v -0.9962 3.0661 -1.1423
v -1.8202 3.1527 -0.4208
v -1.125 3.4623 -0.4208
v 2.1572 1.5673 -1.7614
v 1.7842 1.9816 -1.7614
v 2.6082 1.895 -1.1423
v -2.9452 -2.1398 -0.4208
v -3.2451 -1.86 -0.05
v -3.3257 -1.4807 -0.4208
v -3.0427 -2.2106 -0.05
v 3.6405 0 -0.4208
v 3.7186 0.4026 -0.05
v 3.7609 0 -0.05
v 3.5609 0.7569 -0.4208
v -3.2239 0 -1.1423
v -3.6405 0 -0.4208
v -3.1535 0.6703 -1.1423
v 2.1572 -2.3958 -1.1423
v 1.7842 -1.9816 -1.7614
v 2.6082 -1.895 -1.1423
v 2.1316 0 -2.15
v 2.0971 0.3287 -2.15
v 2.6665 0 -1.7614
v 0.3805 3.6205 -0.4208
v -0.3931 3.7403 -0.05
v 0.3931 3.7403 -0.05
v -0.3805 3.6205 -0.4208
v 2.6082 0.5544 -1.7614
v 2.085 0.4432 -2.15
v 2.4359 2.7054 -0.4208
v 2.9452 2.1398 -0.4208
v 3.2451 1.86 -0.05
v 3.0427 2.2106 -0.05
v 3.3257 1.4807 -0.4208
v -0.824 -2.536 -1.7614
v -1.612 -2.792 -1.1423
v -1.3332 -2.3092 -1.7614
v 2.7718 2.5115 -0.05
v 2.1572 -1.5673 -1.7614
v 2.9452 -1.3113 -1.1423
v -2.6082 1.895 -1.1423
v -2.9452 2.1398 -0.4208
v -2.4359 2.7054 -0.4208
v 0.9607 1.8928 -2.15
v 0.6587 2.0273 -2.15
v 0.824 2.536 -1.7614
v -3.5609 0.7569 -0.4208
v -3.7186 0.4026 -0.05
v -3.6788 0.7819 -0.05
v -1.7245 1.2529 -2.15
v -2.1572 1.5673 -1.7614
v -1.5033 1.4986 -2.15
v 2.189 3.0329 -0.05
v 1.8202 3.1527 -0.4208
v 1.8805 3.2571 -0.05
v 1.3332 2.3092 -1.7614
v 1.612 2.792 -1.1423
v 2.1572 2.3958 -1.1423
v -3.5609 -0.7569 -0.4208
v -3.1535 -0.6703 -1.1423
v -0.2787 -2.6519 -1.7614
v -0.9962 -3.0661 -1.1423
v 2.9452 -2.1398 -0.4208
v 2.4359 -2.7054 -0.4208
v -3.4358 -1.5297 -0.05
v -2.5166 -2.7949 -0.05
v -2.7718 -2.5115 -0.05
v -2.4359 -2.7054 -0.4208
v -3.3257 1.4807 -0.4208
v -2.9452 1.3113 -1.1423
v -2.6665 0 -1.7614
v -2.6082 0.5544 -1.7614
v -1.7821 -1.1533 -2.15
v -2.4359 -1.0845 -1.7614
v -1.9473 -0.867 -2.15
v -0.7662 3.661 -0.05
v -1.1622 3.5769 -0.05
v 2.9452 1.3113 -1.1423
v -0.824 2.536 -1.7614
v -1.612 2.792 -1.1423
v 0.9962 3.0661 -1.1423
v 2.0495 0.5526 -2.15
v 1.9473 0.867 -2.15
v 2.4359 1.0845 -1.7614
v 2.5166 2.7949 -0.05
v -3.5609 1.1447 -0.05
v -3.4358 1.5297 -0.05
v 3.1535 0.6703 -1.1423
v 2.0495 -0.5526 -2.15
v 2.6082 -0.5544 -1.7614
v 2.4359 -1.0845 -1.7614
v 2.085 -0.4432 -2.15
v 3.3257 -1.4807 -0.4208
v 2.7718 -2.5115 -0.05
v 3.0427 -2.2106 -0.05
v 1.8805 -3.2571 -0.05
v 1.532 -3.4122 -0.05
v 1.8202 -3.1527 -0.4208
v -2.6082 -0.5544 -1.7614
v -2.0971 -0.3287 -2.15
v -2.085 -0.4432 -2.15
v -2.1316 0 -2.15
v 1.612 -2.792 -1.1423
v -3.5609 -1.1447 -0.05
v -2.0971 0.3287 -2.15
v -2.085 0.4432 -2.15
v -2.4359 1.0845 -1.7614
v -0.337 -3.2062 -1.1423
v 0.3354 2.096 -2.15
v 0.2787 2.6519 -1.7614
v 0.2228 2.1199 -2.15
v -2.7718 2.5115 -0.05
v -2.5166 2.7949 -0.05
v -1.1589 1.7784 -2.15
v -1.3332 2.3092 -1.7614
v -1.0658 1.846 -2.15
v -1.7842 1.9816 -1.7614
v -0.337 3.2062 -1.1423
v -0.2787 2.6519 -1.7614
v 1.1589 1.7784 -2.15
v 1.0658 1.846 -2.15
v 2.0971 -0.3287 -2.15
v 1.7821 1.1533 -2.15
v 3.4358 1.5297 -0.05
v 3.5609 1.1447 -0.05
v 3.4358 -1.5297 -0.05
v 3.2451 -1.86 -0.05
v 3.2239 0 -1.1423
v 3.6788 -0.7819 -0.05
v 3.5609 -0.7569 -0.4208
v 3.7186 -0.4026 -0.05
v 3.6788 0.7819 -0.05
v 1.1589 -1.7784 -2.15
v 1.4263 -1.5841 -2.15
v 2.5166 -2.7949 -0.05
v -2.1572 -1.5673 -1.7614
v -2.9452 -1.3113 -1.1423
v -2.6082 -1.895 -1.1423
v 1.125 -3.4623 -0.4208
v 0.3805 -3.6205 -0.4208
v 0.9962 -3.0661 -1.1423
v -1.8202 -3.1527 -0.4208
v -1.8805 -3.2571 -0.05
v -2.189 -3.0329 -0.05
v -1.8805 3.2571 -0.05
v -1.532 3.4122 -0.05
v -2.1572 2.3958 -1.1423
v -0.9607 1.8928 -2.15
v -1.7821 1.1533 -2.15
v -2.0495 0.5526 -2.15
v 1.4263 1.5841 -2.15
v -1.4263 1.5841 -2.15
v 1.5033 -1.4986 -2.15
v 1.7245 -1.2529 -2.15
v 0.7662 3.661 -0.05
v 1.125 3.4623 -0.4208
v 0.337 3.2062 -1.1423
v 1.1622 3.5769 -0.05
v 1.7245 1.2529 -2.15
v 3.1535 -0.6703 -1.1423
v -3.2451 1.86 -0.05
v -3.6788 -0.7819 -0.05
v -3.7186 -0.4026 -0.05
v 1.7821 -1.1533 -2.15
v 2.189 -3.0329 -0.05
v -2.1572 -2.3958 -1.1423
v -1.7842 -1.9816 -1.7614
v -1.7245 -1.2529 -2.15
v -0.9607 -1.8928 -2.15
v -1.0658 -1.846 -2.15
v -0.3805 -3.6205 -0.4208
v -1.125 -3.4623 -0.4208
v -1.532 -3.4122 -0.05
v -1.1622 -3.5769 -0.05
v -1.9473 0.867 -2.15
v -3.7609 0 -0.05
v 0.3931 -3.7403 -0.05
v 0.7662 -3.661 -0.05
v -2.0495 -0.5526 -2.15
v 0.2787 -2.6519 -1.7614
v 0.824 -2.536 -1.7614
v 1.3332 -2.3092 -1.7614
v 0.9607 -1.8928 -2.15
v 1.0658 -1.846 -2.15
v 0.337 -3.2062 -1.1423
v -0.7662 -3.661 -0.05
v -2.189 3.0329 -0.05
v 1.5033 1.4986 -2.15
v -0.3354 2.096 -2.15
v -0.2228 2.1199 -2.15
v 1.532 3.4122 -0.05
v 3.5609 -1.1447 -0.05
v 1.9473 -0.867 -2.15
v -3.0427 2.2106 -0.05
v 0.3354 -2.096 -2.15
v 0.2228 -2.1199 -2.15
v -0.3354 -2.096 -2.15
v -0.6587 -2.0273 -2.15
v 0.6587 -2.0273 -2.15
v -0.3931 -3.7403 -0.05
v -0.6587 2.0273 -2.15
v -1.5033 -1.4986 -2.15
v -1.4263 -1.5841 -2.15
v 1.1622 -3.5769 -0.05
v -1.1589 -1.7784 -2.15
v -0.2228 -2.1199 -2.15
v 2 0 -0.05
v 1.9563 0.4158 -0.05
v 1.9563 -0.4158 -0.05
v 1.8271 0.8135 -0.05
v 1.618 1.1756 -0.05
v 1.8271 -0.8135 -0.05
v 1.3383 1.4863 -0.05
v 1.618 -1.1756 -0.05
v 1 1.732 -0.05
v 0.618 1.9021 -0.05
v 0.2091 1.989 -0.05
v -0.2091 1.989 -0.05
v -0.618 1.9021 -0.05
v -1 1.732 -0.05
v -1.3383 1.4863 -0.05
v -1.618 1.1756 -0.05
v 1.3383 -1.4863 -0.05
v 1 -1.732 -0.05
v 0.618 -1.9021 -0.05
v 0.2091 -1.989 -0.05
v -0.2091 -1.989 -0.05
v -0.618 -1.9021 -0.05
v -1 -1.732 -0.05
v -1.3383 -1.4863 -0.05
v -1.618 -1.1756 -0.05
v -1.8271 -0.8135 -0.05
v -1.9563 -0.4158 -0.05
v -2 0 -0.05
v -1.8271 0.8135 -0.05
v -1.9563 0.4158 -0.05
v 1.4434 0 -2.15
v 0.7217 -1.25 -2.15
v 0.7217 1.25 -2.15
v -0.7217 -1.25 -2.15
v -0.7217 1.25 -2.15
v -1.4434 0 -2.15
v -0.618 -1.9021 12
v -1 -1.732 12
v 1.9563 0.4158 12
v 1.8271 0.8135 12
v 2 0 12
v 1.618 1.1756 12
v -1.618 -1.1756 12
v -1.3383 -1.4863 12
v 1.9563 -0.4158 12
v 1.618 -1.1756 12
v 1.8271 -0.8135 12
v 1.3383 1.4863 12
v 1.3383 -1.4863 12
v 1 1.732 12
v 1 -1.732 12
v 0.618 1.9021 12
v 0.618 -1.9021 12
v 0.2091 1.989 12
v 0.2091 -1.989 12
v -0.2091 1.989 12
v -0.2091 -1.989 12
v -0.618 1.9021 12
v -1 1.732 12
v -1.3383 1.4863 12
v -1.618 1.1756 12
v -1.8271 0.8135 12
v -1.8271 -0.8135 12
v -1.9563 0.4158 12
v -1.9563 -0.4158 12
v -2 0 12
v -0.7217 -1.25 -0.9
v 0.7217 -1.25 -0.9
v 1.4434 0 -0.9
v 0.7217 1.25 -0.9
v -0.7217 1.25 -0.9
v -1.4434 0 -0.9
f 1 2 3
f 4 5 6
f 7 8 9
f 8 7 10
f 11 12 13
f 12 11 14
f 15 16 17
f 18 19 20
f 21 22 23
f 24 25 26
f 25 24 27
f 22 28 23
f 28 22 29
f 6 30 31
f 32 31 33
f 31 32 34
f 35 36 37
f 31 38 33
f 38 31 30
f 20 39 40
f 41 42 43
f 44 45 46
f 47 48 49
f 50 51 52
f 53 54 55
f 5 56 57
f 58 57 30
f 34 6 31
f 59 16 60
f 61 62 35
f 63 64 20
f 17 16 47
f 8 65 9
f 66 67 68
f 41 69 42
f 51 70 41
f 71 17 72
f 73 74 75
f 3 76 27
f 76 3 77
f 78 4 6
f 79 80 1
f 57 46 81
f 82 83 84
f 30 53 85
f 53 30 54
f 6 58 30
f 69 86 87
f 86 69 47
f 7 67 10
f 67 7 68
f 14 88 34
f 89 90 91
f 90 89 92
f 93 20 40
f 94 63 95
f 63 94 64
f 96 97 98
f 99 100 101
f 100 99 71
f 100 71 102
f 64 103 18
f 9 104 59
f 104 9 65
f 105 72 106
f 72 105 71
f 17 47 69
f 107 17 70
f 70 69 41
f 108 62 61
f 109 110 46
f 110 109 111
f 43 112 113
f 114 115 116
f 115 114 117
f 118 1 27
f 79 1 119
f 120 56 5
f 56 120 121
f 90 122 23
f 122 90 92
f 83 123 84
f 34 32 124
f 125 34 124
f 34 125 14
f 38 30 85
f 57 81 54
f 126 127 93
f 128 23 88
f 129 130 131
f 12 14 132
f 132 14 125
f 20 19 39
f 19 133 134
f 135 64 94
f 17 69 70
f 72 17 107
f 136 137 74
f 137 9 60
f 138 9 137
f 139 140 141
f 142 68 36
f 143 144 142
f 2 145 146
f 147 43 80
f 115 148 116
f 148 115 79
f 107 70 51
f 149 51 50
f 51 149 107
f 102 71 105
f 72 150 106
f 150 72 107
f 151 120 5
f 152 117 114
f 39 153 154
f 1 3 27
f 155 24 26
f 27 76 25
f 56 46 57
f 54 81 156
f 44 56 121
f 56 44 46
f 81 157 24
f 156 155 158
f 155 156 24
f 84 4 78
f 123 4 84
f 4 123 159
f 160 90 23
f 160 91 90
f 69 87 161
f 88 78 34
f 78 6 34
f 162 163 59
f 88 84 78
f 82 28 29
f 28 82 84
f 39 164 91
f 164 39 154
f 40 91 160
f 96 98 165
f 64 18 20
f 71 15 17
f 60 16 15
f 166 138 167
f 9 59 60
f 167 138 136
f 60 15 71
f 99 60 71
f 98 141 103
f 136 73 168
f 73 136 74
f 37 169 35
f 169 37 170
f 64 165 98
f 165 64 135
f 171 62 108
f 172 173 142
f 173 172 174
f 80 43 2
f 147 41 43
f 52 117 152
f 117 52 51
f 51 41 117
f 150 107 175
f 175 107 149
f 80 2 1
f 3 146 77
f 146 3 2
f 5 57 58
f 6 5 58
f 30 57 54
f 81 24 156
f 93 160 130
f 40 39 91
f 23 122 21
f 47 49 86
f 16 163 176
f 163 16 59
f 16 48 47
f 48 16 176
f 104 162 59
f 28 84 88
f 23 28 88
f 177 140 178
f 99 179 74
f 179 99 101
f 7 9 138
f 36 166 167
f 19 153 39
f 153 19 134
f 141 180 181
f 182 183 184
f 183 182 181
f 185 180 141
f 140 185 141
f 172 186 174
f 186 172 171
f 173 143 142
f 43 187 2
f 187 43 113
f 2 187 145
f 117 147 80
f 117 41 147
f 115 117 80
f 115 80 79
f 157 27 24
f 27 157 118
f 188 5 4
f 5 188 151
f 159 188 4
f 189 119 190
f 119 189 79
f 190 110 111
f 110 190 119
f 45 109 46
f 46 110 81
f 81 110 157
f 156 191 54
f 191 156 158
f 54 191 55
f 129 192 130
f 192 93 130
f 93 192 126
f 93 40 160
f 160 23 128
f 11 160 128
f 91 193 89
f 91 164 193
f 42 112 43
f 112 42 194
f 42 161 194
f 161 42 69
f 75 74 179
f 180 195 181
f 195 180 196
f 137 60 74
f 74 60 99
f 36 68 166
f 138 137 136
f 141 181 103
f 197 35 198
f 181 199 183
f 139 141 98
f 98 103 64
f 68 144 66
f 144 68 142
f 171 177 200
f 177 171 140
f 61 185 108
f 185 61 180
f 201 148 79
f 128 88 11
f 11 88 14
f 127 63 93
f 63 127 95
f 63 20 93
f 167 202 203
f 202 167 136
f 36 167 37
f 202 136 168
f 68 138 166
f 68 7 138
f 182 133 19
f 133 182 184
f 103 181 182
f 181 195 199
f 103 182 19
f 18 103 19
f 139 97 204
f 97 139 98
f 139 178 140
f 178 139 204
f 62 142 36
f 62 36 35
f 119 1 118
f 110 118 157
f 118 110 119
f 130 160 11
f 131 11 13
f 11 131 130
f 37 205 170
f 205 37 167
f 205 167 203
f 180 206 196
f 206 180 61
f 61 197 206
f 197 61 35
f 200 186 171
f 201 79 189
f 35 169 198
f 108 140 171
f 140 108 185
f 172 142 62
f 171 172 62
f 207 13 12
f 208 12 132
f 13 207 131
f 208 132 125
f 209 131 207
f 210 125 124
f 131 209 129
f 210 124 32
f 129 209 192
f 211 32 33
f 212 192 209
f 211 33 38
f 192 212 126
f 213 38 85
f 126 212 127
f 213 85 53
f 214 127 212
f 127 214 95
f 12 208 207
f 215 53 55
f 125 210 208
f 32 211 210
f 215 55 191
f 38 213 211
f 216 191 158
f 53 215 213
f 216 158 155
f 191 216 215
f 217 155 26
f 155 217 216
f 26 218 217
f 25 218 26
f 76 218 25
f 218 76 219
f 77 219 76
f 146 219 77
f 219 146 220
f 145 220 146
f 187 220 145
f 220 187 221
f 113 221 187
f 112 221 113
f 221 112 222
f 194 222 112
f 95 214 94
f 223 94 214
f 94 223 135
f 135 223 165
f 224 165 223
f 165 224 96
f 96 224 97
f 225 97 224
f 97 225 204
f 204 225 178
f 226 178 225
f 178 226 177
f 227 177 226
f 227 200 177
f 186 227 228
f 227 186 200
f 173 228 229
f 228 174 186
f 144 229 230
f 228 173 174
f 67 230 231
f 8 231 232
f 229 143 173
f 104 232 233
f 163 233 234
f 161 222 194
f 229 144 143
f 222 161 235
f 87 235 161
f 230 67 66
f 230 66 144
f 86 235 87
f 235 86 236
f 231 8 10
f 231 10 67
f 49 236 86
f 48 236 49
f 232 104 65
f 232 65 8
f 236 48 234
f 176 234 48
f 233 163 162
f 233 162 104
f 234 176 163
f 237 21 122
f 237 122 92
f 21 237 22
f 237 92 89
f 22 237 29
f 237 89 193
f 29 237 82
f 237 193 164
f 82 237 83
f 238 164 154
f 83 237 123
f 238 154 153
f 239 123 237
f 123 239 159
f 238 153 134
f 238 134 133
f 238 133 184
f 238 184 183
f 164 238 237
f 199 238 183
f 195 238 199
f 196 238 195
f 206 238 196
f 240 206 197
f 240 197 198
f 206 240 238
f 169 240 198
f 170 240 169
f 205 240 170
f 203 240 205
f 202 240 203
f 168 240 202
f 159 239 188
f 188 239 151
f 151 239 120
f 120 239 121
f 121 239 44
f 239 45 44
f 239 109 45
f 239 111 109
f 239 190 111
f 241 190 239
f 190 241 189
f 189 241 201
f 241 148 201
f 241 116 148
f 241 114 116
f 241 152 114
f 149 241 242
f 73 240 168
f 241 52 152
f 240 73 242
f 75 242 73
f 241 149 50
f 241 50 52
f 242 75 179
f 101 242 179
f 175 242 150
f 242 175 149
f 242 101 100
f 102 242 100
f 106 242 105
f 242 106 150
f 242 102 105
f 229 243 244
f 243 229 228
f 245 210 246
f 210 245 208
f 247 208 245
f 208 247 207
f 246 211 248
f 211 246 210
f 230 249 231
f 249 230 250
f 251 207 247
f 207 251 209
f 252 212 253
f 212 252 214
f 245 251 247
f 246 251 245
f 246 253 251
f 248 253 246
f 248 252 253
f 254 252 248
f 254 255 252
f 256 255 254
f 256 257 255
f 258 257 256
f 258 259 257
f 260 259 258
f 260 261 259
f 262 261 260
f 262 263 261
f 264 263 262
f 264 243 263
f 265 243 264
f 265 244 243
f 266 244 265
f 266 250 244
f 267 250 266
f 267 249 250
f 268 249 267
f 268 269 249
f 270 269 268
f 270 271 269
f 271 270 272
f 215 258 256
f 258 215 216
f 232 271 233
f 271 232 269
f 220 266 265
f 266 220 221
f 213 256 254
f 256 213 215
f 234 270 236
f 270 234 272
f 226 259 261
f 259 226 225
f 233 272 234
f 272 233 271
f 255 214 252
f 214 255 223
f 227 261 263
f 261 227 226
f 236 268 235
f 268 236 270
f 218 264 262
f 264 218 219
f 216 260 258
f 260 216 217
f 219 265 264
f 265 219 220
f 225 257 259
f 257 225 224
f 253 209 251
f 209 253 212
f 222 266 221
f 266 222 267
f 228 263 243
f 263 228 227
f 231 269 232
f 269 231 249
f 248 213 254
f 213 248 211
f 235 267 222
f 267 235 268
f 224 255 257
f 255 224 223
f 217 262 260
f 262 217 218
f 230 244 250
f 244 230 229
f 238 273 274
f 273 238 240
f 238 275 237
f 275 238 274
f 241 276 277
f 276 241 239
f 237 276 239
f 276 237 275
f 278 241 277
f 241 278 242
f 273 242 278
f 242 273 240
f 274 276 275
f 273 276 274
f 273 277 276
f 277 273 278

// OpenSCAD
/*
   Copyright 2018 Scott Bezek and the splitflap contributors

   Licensed under the Apache License, Version 2.0 (the "License");
   you may not use this file except in compliance with the License.
   You may obtain a copy of the License at

       http://www.apache.org/licenses/LICENSE-2.0

   Unless required by applicable law or agreed to in writing, software
   distributed under the License is distributed on an "AS IS" BASIS,
   WITHOUT WARRANTIES OR CONDITIONS OF ANY KIND, either express or implied.
   See the License for the specific language governing permissions and
   limitations under the License.
*/

module roughM4_7380(length) {
    eps = 0.1;
    thread_diameter = 4;
    head_diameter = 7.6;
    head_length = 2.2;
    driving_depth = 1.3;
    driving_apothem = 2.5/2;
    driving_radius = driving_apothem / cos(180/6);

    sphere_offset = 1.2;  // Just a guess
    sphere_radius = sqrt(sphere_offset*sphere_offset + (head_diameter/2)*(head_diameter/2));


    difference() {
        union() {
            translate([0, 0, -eps]) {
                cylinder(h=length+eps, d=thread_diameter, $fn=30);
            }
            difference() {
                translate([0, 0, sphere_offset]) {
                    sphere(sphere_radius, $fn=30);
                }
                translate([0, 0, sphere_radius]) {
                    cube([sphere_radius*2 + eps, sphere_radius*2 + eps, sphere_radius*2 + eps], center=true);
                }
                translate([0, 0, -sphere_radius - head_length]) {
                    cube([sphere_radius*2 + eps, sphere_radius*2 + eps, sphere_radius*2 + eps], center=true);
                }
            }
        }
        translate([0, 0, -head_length-eps]) {
            cylinder(h=driving_depth+eps, r=driving_radius, $fn=6);
        }
    }
}

roughM4_7380(12);

        module color_selector(c) {
            precision = 0.0000001;  // arbitrary
            function compare_floats(x, y, i=0) = 
                  (len(x) != len(y)) ? false  // if arrays differ in length, they can't be equal
                : (i >= len(x)) ? true  // if we've hit the end of the arrays without issue, we're equal
                : (x[i] - precision <= y[i]) && x[i] + precision >= y[i]
                    ? compare_floats(x, y, i+1)
                    : false;  // not equal, short circuit

            if (c == [0.5, 0.5, 0.5] || compare_floats(c, [0.5, 0.5, 0.5]))
                children();
        }
                    
